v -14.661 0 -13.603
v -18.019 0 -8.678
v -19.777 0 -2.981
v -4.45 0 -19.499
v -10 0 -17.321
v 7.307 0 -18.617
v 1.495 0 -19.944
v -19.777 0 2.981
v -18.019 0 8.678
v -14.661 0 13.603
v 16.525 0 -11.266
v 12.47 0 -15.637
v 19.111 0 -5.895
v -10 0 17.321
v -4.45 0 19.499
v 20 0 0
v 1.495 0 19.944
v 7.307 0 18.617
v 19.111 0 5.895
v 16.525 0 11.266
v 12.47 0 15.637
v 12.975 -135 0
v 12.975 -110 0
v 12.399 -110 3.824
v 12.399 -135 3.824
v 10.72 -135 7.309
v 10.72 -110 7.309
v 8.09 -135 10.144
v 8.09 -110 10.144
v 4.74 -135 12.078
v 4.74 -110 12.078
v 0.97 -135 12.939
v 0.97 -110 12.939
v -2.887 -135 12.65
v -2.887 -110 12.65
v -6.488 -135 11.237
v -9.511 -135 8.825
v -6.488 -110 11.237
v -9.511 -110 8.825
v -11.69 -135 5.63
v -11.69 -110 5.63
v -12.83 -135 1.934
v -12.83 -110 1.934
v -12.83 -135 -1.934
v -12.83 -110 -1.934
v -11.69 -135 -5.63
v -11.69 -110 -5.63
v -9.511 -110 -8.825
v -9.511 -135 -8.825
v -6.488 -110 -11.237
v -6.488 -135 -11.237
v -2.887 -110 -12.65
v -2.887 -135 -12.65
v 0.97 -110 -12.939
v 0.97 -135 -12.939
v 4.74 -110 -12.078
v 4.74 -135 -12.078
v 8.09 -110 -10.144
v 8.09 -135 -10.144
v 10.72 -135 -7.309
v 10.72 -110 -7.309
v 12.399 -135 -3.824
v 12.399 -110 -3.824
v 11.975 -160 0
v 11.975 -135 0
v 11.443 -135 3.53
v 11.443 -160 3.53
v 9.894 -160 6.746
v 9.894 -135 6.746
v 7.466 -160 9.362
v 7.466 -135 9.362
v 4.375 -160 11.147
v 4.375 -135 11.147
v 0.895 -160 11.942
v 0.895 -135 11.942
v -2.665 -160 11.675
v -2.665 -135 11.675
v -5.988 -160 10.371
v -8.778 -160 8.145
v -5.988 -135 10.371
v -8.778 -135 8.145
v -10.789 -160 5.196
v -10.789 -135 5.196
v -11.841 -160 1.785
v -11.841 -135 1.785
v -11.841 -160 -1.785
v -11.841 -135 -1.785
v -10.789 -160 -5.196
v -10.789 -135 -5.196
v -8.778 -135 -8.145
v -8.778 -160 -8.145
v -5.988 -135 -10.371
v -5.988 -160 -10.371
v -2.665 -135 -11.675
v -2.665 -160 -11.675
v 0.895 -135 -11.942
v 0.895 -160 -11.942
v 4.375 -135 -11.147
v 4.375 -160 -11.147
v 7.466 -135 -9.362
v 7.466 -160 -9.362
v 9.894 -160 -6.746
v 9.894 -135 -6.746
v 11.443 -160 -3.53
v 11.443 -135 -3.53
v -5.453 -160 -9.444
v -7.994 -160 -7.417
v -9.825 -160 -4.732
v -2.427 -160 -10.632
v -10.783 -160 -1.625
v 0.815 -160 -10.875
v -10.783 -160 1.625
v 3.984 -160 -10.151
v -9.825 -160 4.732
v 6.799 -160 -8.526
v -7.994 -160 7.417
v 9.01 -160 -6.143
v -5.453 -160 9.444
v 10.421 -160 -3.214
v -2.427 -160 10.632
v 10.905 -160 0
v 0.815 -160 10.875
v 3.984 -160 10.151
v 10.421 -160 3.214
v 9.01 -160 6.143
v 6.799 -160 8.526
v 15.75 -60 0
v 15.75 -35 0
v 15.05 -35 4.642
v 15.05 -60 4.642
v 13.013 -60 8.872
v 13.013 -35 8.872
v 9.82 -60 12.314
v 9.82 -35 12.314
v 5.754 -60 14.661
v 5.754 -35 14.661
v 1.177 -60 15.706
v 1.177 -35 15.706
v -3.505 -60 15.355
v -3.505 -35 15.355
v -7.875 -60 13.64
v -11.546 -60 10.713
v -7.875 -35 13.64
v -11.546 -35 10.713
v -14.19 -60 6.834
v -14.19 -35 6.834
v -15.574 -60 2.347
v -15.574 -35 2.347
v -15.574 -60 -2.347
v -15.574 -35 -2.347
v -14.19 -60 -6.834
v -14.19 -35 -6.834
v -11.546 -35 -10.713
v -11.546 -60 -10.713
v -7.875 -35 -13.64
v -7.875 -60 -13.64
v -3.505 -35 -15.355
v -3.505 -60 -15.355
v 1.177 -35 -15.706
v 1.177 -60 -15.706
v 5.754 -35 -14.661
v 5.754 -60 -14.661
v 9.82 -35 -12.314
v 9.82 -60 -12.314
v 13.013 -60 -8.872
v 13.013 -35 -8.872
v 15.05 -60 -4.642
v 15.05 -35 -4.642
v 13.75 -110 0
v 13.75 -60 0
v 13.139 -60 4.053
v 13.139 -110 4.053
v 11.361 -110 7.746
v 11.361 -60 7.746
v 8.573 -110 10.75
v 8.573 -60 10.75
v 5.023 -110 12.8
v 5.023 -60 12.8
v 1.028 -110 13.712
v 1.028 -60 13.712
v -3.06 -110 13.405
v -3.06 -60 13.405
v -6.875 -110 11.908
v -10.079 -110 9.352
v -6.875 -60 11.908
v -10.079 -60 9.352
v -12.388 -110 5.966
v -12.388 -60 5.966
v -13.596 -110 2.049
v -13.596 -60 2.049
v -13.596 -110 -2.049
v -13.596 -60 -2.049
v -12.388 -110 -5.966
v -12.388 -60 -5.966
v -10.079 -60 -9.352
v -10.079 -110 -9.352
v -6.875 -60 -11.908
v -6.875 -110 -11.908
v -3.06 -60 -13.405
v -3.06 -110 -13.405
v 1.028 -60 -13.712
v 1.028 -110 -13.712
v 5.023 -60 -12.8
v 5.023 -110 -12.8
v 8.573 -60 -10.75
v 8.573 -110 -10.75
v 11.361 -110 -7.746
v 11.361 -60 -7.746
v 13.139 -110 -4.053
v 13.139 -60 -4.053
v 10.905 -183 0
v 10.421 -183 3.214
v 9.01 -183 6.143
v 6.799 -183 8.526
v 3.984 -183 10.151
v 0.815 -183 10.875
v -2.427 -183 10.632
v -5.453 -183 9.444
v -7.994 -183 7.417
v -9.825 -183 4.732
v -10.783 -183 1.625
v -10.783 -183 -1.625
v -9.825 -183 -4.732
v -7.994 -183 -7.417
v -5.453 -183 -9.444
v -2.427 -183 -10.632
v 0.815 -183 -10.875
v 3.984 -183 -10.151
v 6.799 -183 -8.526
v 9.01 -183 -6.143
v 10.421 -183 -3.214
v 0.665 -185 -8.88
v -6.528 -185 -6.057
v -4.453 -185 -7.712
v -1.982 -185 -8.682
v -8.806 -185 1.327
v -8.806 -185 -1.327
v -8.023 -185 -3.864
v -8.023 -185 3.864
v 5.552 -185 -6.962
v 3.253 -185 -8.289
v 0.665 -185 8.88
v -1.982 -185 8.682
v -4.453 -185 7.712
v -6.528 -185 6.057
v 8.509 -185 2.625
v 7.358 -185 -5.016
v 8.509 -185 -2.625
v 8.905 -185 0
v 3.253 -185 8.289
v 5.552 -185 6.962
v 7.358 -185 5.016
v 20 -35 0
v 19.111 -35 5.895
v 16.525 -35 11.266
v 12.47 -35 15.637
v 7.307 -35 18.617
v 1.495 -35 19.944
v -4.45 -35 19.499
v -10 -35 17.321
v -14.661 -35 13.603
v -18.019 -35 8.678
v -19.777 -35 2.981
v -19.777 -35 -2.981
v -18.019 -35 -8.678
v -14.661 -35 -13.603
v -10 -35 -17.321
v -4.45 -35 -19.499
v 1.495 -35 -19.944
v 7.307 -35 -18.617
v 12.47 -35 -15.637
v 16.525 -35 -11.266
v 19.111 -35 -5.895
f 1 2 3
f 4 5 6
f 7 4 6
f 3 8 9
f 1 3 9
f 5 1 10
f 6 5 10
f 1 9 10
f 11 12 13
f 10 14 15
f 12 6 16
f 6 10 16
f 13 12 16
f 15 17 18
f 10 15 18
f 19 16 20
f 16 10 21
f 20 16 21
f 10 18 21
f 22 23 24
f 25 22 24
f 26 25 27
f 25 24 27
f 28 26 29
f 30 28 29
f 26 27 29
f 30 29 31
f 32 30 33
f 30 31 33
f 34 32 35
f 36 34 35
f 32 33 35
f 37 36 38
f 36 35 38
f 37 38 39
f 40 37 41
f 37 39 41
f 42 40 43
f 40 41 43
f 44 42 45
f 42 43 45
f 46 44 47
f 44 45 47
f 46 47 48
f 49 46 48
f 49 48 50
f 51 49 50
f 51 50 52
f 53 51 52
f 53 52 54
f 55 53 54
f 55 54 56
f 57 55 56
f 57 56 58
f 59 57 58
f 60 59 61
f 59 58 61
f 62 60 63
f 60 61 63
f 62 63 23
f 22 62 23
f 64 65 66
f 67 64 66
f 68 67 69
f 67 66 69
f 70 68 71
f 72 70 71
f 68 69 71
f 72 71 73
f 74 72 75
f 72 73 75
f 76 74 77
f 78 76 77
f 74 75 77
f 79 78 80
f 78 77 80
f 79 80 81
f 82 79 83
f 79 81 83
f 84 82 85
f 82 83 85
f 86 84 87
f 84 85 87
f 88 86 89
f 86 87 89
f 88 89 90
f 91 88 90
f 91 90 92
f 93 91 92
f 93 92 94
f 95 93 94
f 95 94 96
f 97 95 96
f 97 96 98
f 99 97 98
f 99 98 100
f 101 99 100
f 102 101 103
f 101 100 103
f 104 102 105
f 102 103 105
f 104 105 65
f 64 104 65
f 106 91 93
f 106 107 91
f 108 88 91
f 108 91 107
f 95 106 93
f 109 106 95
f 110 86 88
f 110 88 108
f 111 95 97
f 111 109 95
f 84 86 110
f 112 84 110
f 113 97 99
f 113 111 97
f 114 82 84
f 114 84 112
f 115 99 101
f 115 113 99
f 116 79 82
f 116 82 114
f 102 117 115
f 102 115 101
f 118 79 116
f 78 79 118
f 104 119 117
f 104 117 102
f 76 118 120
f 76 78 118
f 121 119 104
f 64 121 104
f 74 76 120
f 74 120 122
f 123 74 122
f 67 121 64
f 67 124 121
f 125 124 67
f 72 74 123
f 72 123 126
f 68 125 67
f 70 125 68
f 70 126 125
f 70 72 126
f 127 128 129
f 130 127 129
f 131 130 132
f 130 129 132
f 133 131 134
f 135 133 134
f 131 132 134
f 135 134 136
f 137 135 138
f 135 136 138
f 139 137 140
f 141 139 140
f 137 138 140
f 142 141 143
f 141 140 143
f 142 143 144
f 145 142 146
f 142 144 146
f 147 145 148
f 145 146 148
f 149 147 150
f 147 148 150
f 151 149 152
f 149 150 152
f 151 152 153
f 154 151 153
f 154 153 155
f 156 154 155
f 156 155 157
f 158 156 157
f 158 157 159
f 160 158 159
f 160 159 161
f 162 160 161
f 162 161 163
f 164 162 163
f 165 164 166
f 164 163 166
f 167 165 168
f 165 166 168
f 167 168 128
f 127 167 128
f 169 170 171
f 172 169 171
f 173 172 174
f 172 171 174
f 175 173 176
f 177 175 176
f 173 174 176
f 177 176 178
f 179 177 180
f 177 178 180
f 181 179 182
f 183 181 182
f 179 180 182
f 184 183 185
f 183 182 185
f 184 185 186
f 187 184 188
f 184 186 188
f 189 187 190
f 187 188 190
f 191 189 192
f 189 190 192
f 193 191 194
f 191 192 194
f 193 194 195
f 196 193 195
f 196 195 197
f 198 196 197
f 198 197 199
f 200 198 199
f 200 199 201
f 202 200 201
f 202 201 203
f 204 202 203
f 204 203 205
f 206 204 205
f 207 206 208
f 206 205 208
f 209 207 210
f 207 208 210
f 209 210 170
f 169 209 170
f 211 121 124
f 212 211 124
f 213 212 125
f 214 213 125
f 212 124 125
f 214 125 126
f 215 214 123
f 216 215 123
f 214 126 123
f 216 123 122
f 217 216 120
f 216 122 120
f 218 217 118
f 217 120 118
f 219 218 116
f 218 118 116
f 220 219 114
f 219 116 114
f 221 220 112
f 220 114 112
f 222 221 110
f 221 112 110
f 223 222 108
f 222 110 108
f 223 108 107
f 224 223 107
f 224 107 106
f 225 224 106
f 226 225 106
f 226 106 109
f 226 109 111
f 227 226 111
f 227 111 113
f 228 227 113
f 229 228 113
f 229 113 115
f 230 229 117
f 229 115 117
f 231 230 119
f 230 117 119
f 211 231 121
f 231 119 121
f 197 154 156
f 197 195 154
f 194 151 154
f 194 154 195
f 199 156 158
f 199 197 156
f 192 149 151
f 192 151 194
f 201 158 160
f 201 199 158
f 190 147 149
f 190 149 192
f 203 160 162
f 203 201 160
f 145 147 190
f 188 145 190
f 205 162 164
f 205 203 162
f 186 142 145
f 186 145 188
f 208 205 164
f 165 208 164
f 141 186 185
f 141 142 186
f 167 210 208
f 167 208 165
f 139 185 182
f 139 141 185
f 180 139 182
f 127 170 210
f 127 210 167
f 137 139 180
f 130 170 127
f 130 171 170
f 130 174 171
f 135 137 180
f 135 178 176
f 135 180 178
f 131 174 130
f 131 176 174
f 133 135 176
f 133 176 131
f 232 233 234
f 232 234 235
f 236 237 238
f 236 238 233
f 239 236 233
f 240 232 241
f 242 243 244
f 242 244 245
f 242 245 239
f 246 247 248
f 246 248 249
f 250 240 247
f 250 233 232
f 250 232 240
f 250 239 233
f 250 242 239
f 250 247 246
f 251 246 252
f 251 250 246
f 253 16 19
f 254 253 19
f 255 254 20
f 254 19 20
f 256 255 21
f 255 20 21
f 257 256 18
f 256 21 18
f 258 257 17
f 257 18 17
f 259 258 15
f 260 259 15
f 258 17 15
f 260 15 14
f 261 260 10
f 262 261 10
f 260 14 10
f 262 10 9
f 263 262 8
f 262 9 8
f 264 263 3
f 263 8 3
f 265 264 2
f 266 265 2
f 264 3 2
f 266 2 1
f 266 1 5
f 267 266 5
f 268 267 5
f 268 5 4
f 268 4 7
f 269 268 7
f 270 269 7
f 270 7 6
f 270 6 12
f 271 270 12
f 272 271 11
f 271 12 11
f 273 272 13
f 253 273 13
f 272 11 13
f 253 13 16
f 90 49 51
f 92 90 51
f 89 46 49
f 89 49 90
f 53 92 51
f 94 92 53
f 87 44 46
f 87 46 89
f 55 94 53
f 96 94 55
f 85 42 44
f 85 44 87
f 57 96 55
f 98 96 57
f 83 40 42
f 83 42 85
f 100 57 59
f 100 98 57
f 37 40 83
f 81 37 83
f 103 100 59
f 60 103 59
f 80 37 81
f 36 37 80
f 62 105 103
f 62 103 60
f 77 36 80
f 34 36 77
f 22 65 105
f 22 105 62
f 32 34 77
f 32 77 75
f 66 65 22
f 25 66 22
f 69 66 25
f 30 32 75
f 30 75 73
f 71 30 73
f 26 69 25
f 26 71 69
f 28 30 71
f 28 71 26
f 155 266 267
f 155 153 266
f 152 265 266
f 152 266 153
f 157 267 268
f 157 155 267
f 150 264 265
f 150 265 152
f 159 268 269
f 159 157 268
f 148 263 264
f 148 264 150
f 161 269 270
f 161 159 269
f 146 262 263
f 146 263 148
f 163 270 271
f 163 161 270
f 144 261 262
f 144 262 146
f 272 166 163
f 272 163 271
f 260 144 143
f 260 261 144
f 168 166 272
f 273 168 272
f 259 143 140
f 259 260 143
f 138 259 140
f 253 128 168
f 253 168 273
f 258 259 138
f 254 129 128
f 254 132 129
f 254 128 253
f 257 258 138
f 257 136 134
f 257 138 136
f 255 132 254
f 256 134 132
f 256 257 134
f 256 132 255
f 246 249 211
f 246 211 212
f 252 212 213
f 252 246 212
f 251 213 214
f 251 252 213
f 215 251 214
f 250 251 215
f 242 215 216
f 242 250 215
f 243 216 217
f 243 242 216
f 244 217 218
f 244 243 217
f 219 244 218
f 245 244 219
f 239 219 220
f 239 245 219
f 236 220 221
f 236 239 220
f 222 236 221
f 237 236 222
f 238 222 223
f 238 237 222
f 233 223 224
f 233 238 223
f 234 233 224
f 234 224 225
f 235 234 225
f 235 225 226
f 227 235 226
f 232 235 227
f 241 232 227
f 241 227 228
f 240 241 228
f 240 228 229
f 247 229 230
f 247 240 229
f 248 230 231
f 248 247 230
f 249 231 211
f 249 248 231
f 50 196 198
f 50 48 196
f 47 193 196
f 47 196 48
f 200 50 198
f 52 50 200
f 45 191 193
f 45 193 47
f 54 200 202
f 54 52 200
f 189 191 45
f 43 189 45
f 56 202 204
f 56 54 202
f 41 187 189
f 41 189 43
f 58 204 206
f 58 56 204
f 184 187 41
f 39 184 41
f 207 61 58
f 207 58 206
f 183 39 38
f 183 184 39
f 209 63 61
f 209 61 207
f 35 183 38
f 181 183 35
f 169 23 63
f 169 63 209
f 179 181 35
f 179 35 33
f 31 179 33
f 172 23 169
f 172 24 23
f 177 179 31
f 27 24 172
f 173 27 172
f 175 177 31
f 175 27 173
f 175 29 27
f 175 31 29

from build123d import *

# Parameters (mm, degrees)
F0_R      = 20
F1_DEPTH  = 35
F3_R      = 15.75
F4_DEPTH  = 25
F6_R      = 13.75
F7_DEPTH  = 50
F8_R      = 12.975
F9_DEPTH  = 25
F10_R     = 11.975
F11_DEPTH = 25
F12_R     = 10.905
F13_DEPTH = 25
F14_SIZE  = 2


with BuildPart() as f1:
    # F0 (on Front) → F1 (new body)
    with BuildSketch(Plane.XZ):
        Circle(F0_R)
    extrude(amount=F1_DEPTH)

    # F3 (on offset) → F4 (join)
    with BuildSketch(Plane.XZ.offset(35)):
        Circle(F3_R)
    extrude(amount=F4_DEPTH)

    # F6 (on offset) → F7 (join)
    with BuildSketch(Plane.XZ.offset(60)):
        Circle(F6_R)
    extrude(amount=F7_DEPTH)

    # F8 (on face) → F9 (join)
    with BuildSketch(Plane.XZ.offset(110)):
        Circle(F8_R)
    extrude(amount=F9_DEPTH)

    # F10 (on face) → F11 (join)
    with BuildSketch(Plane.XZ.offset(135)):
        Circle(F10_R)
    extrude(amount=F11_DEPTH)

    # F12 (on face) → F13 (join)
    with BuildSketch(Plane.XZ.offset(160)):
        Circle(F12_R)
    extrude(amount=F13_DEPTH)

    # F14
    f14_edges = [f1.edges().sort_by_distance(p)[0] for p in [
        (-10.905, -185, 0),
    ]]
    chamfer(f14_edges, length=F14_SIZE)


solid = f1.part
